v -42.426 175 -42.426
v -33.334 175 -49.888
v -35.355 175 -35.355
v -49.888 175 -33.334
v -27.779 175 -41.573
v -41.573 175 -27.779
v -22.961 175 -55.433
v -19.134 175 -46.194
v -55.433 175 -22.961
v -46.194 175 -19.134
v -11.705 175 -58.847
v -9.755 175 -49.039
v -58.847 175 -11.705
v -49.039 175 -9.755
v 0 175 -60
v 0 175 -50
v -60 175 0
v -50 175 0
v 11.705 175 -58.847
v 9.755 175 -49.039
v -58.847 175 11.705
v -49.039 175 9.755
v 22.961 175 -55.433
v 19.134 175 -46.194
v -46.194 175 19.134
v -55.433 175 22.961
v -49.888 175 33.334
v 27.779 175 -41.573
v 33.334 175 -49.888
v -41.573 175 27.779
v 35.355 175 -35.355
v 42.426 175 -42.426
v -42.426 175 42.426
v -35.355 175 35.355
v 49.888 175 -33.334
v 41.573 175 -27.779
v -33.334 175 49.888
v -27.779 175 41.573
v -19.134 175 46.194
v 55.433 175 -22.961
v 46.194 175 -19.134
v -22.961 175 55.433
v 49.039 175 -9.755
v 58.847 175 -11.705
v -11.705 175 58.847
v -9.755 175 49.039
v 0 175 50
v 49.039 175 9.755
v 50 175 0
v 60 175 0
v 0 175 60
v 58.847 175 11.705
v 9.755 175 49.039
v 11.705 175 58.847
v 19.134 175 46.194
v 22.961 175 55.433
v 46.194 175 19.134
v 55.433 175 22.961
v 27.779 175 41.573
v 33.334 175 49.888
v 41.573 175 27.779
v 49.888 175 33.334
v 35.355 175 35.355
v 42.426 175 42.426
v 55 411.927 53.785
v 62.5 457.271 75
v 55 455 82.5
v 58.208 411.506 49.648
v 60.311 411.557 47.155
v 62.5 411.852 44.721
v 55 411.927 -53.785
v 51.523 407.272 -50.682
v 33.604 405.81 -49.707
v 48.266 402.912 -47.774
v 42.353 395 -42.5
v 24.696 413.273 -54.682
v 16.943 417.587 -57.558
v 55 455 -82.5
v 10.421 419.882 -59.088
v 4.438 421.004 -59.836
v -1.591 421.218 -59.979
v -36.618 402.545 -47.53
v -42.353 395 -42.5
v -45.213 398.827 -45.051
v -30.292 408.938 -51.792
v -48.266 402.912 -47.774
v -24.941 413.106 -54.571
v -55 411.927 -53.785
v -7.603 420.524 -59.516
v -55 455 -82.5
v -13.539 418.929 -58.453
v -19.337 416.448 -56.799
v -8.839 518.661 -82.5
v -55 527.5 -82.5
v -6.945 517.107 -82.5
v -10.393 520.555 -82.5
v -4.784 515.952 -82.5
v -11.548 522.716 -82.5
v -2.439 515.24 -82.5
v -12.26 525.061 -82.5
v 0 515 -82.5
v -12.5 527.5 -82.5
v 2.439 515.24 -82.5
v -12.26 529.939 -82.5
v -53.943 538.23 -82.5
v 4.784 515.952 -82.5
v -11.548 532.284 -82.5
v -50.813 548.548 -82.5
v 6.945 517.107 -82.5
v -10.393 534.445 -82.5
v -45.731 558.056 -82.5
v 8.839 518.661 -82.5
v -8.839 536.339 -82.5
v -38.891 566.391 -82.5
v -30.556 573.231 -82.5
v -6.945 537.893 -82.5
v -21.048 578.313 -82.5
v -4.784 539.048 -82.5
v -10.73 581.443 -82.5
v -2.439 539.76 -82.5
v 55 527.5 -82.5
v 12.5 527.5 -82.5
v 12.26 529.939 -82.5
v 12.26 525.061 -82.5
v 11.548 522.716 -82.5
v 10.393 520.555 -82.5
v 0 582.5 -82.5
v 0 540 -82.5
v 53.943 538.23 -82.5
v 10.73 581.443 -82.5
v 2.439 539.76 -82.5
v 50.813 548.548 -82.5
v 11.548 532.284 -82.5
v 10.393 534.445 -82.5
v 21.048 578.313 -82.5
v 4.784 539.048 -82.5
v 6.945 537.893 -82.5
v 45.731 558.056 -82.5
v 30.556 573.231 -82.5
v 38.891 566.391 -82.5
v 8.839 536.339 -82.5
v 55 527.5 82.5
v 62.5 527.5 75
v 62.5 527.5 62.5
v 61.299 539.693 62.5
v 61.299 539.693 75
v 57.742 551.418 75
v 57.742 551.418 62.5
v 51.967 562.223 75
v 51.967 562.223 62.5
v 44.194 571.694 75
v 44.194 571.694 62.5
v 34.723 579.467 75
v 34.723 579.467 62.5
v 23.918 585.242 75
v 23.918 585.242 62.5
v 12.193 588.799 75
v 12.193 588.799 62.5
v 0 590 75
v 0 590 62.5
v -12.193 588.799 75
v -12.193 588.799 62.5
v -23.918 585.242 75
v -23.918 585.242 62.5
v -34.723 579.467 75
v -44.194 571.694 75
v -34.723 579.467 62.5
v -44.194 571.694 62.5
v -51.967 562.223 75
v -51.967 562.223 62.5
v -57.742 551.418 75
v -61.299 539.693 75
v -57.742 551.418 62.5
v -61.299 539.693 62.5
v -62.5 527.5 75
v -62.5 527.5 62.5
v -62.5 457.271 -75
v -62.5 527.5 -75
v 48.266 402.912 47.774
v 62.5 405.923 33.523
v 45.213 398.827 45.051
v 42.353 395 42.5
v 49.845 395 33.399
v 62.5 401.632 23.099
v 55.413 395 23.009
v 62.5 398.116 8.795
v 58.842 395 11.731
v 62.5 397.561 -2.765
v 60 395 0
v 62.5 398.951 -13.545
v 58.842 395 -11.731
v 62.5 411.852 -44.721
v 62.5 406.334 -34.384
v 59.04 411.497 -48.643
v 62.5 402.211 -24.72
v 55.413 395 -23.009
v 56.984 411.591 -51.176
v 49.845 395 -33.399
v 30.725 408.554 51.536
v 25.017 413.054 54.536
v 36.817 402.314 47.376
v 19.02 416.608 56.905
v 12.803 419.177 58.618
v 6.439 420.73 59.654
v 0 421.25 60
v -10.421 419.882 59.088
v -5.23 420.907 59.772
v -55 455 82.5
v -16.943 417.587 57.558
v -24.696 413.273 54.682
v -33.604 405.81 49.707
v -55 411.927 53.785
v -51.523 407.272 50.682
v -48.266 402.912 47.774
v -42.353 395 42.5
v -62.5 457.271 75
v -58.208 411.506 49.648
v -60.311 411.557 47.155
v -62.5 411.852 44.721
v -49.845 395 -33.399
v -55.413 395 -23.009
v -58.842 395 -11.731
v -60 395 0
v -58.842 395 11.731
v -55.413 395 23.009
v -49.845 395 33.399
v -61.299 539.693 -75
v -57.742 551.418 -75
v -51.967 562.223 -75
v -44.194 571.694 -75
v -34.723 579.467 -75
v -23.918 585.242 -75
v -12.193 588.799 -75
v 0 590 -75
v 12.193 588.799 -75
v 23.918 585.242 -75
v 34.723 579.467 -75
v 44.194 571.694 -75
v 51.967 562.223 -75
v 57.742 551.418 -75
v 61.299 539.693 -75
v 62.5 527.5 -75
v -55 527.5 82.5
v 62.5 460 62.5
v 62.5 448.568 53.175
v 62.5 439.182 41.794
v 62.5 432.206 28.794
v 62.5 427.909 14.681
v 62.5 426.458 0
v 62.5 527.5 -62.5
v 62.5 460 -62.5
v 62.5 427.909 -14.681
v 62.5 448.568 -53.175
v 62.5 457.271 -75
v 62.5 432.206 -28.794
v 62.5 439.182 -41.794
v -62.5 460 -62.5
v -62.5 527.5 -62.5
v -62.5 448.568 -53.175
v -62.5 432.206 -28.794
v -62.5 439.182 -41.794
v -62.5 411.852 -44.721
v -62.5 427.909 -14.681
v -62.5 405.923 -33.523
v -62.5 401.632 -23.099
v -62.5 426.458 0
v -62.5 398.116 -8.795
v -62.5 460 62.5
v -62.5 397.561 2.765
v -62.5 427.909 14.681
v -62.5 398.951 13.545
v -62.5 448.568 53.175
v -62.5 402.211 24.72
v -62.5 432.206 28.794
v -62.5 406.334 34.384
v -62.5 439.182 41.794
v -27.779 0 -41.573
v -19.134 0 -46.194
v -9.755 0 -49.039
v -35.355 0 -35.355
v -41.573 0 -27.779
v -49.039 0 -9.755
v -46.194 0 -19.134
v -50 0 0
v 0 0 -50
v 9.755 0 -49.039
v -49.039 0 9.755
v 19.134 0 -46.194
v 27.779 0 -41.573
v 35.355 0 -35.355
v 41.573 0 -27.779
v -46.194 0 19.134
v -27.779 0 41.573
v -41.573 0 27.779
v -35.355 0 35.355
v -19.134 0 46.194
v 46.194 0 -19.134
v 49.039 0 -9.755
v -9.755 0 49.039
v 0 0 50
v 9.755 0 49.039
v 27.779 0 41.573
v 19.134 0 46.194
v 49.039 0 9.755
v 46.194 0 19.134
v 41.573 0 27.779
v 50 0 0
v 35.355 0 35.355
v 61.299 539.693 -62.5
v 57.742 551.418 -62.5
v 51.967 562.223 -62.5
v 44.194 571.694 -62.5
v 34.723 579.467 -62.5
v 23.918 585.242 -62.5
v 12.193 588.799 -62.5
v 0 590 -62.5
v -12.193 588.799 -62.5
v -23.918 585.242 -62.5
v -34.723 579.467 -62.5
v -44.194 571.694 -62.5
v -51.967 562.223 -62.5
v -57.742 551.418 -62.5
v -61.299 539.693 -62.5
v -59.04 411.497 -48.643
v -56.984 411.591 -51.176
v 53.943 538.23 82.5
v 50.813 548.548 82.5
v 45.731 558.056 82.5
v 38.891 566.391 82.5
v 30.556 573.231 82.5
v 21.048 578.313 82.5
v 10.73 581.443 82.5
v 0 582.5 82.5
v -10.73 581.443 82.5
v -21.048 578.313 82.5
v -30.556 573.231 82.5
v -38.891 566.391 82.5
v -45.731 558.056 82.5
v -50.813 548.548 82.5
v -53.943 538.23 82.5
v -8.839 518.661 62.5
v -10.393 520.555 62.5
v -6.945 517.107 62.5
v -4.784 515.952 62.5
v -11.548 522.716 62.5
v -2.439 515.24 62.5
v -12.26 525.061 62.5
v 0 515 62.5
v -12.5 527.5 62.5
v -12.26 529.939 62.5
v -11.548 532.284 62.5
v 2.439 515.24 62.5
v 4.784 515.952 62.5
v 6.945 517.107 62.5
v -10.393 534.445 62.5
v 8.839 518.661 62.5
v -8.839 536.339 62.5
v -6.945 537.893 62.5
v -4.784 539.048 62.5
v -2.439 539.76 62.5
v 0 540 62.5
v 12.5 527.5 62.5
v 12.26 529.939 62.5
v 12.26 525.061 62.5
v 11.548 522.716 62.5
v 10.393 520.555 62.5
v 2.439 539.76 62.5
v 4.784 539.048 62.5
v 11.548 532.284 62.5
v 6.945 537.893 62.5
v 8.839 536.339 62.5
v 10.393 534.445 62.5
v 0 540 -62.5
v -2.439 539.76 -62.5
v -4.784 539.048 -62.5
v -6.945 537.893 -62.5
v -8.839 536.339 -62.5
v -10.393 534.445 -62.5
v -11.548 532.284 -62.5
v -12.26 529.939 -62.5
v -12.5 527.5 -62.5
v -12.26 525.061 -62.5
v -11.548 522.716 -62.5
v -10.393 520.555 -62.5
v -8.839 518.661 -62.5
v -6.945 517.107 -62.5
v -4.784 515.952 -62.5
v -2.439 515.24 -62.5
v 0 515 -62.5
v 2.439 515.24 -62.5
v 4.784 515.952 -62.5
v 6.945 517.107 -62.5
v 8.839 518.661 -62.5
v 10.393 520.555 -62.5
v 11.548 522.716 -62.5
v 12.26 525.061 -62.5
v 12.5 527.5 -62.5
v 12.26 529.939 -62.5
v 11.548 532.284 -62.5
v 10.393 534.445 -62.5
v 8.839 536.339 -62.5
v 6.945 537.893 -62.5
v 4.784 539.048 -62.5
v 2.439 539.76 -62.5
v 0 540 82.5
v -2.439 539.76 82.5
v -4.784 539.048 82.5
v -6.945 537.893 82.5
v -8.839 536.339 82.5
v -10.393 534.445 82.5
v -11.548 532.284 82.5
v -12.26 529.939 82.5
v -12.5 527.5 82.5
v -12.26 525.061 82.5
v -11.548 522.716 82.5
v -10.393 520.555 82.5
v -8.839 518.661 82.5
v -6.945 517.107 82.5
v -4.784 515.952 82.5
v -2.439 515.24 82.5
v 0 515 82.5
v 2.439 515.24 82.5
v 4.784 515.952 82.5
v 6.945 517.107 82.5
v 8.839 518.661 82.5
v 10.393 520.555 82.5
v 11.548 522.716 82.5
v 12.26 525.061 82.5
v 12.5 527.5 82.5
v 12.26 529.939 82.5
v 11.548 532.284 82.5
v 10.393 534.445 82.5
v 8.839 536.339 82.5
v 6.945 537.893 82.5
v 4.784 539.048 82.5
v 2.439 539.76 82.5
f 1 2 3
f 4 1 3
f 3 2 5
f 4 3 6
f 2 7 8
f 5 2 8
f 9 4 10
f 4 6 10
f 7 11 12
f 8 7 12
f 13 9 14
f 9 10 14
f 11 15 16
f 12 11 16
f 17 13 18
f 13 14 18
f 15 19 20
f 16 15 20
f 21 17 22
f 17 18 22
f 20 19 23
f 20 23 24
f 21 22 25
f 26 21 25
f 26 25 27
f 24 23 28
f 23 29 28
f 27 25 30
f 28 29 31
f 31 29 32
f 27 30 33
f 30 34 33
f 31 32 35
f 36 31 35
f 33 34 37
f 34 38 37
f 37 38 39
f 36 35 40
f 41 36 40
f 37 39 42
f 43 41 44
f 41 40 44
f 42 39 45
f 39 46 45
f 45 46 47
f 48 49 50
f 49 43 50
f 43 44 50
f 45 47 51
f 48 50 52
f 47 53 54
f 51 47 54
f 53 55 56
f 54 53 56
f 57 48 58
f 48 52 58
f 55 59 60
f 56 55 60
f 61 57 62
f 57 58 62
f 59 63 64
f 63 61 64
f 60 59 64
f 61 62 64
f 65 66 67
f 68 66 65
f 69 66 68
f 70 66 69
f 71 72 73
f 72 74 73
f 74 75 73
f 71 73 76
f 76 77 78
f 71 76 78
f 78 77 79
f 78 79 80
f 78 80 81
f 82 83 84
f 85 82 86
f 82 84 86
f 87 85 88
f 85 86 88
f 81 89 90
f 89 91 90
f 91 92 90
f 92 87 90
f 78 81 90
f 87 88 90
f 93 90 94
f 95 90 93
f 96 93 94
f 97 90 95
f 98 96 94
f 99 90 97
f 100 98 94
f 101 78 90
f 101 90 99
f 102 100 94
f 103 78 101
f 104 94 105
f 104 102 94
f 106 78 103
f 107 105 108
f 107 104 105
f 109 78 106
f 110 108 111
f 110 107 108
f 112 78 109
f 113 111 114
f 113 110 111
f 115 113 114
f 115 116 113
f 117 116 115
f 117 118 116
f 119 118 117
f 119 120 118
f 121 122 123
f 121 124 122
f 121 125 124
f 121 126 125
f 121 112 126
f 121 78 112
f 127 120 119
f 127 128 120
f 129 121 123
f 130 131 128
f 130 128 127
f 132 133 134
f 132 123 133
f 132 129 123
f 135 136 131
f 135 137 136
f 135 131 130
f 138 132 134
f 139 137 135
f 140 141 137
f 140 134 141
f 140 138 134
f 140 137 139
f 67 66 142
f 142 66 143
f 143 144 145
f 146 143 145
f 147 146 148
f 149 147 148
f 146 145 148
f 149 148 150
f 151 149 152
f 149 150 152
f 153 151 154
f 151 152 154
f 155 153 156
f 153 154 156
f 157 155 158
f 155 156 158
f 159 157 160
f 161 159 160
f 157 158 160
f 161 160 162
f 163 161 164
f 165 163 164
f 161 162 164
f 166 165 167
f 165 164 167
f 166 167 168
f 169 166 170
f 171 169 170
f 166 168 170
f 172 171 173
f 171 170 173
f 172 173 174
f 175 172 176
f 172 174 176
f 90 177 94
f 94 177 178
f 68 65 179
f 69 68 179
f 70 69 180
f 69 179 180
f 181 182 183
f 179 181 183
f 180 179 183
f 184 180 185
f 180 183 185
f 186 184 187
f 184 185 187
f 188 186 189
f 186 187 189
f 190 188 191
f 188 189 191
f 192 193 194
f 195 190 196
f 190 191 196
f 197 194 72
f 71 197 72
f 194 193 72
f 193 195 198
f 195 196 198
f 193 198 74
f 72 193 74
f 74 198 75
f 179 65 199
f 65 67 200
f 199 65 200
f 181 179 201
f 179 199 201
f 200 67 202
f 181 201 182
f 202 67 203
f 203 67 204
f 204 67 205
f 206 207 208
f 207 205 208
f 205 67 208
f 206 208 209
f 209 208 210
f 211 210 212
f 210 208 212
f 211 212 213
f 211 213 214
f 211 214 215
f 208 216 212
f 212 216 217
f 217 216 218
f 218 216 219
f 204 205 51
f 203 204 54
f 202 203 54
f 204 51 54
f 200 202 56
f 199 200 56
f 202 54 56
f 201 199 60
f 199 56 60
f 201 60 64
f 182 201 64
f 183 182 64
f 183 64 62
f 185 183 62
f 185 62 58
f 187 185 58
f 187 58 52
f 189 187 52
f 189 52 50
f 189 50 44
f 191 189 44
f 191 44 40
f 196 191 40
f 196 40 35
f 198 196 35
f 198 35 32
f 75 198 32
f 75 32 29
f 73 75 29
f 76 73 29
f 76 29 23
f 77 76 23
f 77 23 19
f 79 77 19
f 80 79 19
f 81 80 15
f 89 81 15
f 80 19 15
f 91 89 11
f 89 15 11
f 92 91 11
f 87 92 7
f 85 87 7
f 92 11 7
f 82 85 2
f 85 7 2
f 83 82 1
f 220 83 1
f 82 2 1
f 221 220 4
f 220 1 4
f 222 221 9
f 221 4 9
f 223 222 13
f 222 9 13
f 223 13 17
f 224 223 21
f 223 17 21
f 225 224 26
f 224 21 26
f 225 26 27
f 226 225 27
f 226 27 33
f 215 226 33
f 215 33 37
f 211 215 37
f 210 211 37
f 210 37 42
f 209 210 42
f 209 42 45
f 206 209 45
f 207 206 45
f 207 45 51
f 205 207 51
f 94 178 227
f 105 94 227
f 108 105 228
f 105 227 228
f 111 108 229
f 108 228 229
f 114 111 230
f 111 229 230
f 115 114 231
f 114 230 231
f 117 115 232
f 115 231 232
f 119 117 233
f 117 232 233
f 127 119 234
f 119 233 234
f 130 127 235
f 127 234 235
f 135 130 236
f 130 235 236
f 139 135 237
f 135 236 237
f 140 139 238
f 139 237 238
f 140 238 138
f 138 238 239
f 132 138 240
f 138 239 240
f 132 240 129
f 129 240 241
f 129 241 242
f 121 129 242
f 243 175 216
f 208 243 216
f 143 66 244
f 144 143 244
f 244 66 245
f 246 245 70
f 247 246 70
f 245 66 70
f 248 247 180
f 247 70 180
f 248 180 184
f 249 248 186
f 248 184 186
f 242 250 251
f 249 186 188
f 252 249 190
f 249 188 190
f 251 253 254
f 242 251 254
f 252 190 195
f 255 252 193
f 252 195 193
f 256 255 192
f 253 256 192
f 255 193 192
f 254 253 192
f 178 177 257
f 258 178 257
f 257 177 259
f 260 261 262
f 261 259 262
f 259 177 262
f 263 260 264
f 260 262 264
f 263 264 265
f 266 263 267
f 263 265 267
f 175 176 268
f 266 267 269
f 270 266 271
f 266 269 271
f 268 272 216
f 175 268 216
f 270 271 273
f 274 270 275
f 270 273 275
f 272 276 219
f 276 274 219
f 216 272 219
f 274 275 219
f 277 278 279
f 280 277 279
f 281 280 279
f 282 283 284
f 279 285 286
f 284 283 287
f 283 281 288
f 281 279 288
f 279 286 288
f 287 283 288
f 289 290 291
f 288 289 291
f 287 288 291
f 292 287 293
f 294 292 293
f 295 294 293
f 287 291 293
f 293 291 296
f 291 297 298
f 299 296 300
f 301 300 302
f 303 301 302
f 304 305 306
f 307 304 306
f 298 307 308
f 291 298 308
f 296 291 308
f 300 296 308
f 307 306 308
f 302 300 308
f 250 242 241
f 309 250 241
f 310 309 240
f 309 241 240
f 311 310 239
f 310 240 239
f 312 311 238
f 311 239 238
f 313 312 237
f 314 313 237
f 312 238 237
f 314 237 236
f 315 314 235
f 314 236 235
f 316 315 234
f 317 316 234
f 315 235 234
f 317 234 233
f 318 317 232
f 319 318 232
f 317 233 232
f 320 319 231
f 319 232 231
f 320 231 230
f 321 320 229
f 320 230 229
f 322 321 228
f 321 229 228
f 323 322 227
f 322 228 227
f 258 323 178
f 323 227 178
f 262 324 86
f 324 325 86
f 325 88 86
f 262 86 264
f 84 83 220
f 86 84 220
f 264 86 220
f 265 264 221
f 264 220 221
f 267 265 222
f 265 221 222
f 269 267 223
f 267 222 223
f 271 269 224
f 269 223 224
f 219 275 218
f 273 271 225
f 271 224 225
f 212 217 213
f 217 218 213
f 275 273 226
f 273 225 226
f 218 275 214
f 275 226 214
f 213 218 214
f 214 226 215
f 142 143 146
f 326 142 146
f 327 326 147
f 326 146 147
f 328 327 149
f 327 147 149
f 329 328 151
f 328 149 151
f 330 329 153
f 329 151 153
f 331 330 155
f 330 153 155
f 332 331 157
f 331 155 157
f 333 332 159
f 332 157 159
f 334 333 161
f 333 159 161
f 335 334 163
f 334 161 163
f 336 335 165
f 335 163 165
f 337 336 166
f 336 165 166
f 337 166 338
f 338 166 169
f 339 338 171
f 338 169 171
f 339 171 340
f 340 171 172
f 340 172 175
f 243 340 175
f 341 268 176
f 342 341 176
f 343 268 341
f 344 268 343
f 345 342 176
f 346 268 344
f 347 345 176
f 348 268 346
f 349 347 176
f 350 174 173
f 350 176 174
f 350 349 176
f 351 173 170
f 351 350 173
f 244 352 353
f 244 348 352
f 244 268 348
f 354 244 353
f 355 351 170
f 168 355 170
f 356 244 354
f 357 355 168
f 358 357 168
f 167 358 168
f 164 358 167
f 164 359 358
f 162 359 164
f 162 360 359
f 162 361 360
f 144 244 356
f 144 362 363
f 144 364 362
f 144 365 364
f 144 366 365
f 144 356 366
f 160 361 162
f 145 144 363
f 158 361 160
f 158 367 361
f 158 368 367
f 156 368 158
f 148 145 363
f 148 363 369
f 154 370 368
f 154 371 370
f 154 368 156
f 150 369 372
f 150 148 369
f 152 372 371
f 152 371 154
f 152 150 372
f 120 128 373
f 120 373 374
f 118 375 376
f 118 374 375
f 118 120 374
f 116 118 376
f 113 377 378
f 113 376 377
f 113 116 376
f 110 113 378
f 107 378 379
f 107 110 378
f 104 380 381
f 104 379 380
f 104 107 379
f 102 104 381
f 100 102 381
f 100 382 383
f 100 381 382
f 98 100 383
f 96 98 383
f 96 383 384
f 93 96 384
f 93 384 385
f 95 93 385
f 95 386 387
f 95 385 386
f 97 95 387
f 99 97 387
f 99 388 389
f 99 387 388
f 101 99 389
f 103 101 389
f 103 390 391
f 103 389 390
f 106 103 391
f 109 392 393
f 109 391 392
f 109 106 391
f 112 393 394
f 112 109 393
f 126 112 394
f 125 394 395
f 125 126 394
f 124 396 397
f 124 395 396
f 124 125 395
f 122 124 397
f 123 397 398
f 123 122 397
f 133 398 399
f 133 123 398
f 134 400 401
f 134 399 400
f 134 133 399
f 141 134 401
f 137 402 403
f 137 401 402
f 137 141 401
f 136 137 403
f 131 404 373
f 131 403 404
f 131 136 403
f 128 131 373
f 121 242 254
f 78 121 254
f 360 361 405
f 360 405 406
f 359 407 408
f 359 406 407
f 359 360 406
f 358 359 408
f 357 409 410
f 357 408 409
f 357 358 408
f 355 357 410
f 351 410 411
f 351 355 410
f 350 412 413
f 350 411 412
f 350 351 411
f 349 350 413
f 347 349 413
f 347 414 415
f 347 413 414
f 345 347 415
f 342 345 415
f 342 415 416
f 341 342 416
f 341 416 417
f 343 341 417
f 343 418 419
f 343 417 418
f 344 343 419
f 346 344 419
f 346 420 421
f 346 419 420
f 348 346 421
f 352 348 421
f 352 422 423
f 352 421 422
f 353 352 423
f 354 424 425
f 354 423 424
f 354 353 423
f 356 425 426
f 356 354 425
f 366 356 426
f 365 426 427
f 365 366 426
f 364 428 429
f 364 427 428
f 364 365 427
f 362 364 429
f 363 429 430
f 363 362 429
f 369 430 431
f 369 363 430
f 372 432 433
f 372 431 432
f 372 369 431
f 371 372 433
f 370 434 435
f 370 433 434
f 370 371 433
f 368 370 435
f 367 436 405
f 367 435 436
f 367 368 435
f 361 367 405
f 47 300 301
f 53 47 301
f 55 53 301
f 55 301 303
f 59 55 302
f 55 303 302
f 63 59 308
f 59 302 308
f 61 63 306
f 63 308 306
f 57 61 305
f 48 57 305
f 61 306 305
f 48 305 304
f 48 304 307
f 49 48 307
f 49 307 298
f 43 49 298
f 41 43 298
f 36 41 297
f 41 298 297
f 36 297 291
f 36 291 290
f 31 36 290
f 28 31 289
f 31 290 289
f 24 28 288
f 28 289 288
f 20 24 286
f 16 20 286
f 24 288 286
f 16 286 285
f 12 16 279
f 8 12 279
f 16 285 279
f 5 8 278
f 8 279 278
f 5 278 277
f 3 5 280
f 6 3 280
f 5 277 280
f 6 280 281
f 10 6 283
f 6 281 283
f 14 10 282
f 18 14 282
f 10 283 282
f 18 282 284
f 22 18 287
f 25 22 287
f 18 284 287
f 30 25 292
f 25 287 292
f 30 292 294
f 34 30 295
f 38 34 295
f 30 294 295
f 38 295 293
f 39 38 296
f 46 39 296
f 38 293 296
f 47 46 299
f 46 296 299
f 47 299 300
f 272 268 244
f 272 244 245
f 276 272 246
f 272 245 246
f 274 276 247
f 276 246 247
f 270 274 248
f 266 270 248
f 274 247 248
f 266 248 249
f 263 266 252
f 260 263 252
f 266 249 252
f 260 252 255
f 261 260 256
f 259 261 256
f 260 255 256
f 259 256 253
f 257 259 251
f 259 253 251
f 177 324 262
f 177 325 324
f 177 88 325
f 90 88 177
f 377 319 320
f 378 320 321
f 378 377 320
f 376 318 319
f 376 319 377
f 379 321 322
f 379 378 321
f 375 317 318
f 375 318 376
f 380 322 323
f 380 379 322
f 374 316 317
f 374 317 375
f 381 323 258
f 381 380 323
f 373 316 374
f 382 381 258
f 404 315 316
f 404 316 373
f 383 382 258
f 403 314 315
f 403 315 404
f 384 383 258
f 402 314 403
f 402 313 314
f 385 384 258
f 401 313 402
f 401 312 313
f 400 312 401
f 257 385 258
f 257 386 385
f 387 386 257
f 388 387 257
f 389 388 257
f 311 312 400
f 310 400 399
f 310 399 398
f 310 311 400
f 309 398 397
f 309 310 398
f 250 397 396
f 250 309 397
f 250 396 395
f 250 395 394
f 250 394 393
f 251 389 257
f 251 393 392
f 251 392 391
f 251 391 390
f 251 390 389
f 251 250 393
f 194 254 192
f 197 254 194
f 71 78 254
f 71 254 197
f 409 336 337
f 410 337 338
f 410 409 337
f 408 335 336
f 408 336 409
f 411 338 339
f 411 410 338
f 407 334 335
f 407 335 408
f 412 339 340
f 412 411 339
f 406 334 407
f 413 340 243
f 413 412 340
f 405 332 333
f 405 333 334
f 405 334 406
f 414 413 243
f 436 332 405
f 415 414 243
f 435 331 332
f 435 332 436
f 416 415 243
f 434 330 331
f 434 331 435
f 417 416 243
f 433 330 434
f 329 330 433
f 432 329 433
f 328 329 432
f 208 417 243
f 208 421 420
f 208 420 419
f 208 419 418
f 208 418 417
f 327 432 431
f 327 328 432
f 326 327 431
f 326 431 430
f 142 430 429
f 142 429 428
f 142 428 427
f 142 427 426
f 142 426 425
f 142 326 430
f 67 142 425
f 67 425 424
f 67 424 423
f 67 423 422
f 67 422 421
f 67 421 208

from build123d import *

# Parameters (mm, degrees)
SKETCH1_R               = 50
BOSS_EXTRUDE1_DEPTH     = 175
SKETCH4_R               = 60
BOSS_EXTRUDE3_DEPTH     = 250
BOSS_EXTRUDE4_DEPTH     = 62.5
CUT_EXTRUDE2_DEPTH      = 616.817546031
CUT_EXTRUDE2_DEPTH_BACK = 616.817546031
SKETCH6_R               = 12.5
CHAMFER2_SIZE           = 30
CHAMFER3_SIZE           = 7.5
CUT_EXTRUDE3_DEPTH      = 609.712781203
CUT_EXTRUDE3_DEPTH_BACK = 609.712781203


with BuildPart() as part:
    # Sketch1 → Boss-Extrude1 (new body)
    with BuildSketch(Plane(origin=(0, 0, 0), x_dir=(1, 0, 0), z_dir=(0, 1, 0))):
        with Locations(Location((0, 0, 0), (0, 0, 270))):
            Circle(SKETCH1_R)
    extrude(amount=BOSS_EXTRUDE1_DEPTH)

    # Sketch4 → Boss-Extrude3 (add)
    with BuildSketch(Plane(origin=(0, 175, 0), x_dir=(1, 0, 0), z_dir=(0, 1, 0))):
        with Locations(Location((0, 0, 0), (0, 0, 270))):
            Circle(SKETCH4_R)
    extrude(amount=BOSS_EXTRUDE3_DEPTH)

    # Sketch5 → Boss-Extrude4 (add, symmetric)
    with BuildSketch(Plane(origin=(0, 0, 0), x_dir=(0, 0, -1), z_dir=(1, 0, 0))):
        Polygon((-62.5, 425), (62.5, 425), (82.5, 455), (82.5, 590), (62.5, 590), (62.5, 460), (-62.5, 460), (-62.5, 590), (-82.5, 590), (-82.5, 455), align=None)
    extrude(amount=BOSS_EXTRUDE4_DEPTH, both=True)

    # Sketch6 → Cut-Extrude2 (cut, two sides: drawn at the far end of the back side and taken through both)
    with BuildSketch(Plane.XY.offset(82.5).offset(-CUT_EXTRUDE2_DEPTH_BACK)):
        with Locations(Location((0, 527.5, 0), (0, 0, 90))):
            Circle(SKETCH6_R)
        with BuildLine():
            Line((-62.5, 527.5), (-67.5, 527.5))
            Line((-67.5, 527.5), (-67.5, 595))
            Line((-67.5, 595), (67.5, 595))
            Line((67.5, 595), (67.5, 527.5))
            Line((67.5, 527.5), (62.5, 527.5))
            ThreePointArc((62.5, 527.5), (0, 590), (-62.5, 527.5))
        make_face()
    extrude(amount=CUT_EXTRUDE2_DEPTH + CUT_EXTRUDE2_DEPTH_BACK, mode=Mode.SUBTRACT)

    # Chamfer2
    # the kernel refuses this chamfer: 30 mm, written as the material it adds along each edge
    with BuildSketch(Plane(origin=(0, 425, 0), x_dir=(0, 0, 1), z_dir=(-1, 0, 0))) as chamfer2_piece_1_section:
        Polygon((60 + CHAMFER2_SIZE, 0), (60, -CHAMFER2_SIZE), (60, 0), align=None)
    chamfer2_piece_1 = revolve(axis=Axis((0, 425, 0), (0, 1, 0)), mode=Mode.PRIVATE)
    chamfer2_piece_1 = split(chamfer2_piece_1, bisect_by=Plane(origin=(-62.5, 399.085825085, 31.840161024), z_dir=(1, 0, 0)), keep=Keep.TOP, mode=Mode.PRIVATE)
    chamfer2_piece_1 = split(chamfer2_piece_1, bisect_by=Plane(origin=(54.930093835, 392.908722455, 41.10581497), z_dir=(0, 0.5547001962252294, -0.8320502943378435)), keep=Keep.TOP, mode=Mode.PRIVATE)
    chamfer2_piece_1 = split(chamfer2_piece_1, bisect_by=Plane(origin=(54.930093835, 363.517804586, -21.511869724), z_dir=(0, 0.5547001962252294, 0.8320502943378435)), keep=Keep.TOP, mode=Mode.PRIVATE)
    chamfer2_piece_1 = split(chamfer2_piece_1, bisect_by=Plane(origin=(62.5, 399.085825085, 31.840161024), z_dir=(-1, 0, 0)), keep=Keep.TOP, mode=Mode.PRIVATE)
    add(chamfer2_piece_1)

    # Chamfer3
    chamfer3_edges = [part.edges().sort_by_distance(p)[0] for p in [
        (-62.5, 438.486605007, 71.491070005),
        (-62.5, 438.486605007, -71.491070005),
        (-62.5, 491.25, -82.5),
        (62.5, 438.486605007, 71.491070005),
        (62.5, 438.486605007, -71.491070005),
        (62.5, 491.25, -82.5),
        (-62.5, 491.25, 82.5),
        (62.5, 491.25, 82.5),
        (0, 590, -82.5),
    ]]
    chamfer(chamfer3_edges, length=CHAMFER3_SIZE)

    # Sketch7 → Cut-Extrude3 (cut, two sides: drawn at the far end of the back side and taken through both)
    with BuildSketch(Plane.ZY.offset(62.5).offset(-CUT_EXTRUDE3_DEPTH_BACK)):
        with BuildLine():
            Line((-62.5, 460), (62.5, 460))
            ThreePointArc((62.5, 460), (0, 426.457809879), (-62.5, 460))
        make_face()
    extrude(amount=CUT_EXTRUDE3_DEPTH + CUT_EXTRUDE3_DEPTH_BACK, mode=Mode.SUBTRACT)


solid = part.part
